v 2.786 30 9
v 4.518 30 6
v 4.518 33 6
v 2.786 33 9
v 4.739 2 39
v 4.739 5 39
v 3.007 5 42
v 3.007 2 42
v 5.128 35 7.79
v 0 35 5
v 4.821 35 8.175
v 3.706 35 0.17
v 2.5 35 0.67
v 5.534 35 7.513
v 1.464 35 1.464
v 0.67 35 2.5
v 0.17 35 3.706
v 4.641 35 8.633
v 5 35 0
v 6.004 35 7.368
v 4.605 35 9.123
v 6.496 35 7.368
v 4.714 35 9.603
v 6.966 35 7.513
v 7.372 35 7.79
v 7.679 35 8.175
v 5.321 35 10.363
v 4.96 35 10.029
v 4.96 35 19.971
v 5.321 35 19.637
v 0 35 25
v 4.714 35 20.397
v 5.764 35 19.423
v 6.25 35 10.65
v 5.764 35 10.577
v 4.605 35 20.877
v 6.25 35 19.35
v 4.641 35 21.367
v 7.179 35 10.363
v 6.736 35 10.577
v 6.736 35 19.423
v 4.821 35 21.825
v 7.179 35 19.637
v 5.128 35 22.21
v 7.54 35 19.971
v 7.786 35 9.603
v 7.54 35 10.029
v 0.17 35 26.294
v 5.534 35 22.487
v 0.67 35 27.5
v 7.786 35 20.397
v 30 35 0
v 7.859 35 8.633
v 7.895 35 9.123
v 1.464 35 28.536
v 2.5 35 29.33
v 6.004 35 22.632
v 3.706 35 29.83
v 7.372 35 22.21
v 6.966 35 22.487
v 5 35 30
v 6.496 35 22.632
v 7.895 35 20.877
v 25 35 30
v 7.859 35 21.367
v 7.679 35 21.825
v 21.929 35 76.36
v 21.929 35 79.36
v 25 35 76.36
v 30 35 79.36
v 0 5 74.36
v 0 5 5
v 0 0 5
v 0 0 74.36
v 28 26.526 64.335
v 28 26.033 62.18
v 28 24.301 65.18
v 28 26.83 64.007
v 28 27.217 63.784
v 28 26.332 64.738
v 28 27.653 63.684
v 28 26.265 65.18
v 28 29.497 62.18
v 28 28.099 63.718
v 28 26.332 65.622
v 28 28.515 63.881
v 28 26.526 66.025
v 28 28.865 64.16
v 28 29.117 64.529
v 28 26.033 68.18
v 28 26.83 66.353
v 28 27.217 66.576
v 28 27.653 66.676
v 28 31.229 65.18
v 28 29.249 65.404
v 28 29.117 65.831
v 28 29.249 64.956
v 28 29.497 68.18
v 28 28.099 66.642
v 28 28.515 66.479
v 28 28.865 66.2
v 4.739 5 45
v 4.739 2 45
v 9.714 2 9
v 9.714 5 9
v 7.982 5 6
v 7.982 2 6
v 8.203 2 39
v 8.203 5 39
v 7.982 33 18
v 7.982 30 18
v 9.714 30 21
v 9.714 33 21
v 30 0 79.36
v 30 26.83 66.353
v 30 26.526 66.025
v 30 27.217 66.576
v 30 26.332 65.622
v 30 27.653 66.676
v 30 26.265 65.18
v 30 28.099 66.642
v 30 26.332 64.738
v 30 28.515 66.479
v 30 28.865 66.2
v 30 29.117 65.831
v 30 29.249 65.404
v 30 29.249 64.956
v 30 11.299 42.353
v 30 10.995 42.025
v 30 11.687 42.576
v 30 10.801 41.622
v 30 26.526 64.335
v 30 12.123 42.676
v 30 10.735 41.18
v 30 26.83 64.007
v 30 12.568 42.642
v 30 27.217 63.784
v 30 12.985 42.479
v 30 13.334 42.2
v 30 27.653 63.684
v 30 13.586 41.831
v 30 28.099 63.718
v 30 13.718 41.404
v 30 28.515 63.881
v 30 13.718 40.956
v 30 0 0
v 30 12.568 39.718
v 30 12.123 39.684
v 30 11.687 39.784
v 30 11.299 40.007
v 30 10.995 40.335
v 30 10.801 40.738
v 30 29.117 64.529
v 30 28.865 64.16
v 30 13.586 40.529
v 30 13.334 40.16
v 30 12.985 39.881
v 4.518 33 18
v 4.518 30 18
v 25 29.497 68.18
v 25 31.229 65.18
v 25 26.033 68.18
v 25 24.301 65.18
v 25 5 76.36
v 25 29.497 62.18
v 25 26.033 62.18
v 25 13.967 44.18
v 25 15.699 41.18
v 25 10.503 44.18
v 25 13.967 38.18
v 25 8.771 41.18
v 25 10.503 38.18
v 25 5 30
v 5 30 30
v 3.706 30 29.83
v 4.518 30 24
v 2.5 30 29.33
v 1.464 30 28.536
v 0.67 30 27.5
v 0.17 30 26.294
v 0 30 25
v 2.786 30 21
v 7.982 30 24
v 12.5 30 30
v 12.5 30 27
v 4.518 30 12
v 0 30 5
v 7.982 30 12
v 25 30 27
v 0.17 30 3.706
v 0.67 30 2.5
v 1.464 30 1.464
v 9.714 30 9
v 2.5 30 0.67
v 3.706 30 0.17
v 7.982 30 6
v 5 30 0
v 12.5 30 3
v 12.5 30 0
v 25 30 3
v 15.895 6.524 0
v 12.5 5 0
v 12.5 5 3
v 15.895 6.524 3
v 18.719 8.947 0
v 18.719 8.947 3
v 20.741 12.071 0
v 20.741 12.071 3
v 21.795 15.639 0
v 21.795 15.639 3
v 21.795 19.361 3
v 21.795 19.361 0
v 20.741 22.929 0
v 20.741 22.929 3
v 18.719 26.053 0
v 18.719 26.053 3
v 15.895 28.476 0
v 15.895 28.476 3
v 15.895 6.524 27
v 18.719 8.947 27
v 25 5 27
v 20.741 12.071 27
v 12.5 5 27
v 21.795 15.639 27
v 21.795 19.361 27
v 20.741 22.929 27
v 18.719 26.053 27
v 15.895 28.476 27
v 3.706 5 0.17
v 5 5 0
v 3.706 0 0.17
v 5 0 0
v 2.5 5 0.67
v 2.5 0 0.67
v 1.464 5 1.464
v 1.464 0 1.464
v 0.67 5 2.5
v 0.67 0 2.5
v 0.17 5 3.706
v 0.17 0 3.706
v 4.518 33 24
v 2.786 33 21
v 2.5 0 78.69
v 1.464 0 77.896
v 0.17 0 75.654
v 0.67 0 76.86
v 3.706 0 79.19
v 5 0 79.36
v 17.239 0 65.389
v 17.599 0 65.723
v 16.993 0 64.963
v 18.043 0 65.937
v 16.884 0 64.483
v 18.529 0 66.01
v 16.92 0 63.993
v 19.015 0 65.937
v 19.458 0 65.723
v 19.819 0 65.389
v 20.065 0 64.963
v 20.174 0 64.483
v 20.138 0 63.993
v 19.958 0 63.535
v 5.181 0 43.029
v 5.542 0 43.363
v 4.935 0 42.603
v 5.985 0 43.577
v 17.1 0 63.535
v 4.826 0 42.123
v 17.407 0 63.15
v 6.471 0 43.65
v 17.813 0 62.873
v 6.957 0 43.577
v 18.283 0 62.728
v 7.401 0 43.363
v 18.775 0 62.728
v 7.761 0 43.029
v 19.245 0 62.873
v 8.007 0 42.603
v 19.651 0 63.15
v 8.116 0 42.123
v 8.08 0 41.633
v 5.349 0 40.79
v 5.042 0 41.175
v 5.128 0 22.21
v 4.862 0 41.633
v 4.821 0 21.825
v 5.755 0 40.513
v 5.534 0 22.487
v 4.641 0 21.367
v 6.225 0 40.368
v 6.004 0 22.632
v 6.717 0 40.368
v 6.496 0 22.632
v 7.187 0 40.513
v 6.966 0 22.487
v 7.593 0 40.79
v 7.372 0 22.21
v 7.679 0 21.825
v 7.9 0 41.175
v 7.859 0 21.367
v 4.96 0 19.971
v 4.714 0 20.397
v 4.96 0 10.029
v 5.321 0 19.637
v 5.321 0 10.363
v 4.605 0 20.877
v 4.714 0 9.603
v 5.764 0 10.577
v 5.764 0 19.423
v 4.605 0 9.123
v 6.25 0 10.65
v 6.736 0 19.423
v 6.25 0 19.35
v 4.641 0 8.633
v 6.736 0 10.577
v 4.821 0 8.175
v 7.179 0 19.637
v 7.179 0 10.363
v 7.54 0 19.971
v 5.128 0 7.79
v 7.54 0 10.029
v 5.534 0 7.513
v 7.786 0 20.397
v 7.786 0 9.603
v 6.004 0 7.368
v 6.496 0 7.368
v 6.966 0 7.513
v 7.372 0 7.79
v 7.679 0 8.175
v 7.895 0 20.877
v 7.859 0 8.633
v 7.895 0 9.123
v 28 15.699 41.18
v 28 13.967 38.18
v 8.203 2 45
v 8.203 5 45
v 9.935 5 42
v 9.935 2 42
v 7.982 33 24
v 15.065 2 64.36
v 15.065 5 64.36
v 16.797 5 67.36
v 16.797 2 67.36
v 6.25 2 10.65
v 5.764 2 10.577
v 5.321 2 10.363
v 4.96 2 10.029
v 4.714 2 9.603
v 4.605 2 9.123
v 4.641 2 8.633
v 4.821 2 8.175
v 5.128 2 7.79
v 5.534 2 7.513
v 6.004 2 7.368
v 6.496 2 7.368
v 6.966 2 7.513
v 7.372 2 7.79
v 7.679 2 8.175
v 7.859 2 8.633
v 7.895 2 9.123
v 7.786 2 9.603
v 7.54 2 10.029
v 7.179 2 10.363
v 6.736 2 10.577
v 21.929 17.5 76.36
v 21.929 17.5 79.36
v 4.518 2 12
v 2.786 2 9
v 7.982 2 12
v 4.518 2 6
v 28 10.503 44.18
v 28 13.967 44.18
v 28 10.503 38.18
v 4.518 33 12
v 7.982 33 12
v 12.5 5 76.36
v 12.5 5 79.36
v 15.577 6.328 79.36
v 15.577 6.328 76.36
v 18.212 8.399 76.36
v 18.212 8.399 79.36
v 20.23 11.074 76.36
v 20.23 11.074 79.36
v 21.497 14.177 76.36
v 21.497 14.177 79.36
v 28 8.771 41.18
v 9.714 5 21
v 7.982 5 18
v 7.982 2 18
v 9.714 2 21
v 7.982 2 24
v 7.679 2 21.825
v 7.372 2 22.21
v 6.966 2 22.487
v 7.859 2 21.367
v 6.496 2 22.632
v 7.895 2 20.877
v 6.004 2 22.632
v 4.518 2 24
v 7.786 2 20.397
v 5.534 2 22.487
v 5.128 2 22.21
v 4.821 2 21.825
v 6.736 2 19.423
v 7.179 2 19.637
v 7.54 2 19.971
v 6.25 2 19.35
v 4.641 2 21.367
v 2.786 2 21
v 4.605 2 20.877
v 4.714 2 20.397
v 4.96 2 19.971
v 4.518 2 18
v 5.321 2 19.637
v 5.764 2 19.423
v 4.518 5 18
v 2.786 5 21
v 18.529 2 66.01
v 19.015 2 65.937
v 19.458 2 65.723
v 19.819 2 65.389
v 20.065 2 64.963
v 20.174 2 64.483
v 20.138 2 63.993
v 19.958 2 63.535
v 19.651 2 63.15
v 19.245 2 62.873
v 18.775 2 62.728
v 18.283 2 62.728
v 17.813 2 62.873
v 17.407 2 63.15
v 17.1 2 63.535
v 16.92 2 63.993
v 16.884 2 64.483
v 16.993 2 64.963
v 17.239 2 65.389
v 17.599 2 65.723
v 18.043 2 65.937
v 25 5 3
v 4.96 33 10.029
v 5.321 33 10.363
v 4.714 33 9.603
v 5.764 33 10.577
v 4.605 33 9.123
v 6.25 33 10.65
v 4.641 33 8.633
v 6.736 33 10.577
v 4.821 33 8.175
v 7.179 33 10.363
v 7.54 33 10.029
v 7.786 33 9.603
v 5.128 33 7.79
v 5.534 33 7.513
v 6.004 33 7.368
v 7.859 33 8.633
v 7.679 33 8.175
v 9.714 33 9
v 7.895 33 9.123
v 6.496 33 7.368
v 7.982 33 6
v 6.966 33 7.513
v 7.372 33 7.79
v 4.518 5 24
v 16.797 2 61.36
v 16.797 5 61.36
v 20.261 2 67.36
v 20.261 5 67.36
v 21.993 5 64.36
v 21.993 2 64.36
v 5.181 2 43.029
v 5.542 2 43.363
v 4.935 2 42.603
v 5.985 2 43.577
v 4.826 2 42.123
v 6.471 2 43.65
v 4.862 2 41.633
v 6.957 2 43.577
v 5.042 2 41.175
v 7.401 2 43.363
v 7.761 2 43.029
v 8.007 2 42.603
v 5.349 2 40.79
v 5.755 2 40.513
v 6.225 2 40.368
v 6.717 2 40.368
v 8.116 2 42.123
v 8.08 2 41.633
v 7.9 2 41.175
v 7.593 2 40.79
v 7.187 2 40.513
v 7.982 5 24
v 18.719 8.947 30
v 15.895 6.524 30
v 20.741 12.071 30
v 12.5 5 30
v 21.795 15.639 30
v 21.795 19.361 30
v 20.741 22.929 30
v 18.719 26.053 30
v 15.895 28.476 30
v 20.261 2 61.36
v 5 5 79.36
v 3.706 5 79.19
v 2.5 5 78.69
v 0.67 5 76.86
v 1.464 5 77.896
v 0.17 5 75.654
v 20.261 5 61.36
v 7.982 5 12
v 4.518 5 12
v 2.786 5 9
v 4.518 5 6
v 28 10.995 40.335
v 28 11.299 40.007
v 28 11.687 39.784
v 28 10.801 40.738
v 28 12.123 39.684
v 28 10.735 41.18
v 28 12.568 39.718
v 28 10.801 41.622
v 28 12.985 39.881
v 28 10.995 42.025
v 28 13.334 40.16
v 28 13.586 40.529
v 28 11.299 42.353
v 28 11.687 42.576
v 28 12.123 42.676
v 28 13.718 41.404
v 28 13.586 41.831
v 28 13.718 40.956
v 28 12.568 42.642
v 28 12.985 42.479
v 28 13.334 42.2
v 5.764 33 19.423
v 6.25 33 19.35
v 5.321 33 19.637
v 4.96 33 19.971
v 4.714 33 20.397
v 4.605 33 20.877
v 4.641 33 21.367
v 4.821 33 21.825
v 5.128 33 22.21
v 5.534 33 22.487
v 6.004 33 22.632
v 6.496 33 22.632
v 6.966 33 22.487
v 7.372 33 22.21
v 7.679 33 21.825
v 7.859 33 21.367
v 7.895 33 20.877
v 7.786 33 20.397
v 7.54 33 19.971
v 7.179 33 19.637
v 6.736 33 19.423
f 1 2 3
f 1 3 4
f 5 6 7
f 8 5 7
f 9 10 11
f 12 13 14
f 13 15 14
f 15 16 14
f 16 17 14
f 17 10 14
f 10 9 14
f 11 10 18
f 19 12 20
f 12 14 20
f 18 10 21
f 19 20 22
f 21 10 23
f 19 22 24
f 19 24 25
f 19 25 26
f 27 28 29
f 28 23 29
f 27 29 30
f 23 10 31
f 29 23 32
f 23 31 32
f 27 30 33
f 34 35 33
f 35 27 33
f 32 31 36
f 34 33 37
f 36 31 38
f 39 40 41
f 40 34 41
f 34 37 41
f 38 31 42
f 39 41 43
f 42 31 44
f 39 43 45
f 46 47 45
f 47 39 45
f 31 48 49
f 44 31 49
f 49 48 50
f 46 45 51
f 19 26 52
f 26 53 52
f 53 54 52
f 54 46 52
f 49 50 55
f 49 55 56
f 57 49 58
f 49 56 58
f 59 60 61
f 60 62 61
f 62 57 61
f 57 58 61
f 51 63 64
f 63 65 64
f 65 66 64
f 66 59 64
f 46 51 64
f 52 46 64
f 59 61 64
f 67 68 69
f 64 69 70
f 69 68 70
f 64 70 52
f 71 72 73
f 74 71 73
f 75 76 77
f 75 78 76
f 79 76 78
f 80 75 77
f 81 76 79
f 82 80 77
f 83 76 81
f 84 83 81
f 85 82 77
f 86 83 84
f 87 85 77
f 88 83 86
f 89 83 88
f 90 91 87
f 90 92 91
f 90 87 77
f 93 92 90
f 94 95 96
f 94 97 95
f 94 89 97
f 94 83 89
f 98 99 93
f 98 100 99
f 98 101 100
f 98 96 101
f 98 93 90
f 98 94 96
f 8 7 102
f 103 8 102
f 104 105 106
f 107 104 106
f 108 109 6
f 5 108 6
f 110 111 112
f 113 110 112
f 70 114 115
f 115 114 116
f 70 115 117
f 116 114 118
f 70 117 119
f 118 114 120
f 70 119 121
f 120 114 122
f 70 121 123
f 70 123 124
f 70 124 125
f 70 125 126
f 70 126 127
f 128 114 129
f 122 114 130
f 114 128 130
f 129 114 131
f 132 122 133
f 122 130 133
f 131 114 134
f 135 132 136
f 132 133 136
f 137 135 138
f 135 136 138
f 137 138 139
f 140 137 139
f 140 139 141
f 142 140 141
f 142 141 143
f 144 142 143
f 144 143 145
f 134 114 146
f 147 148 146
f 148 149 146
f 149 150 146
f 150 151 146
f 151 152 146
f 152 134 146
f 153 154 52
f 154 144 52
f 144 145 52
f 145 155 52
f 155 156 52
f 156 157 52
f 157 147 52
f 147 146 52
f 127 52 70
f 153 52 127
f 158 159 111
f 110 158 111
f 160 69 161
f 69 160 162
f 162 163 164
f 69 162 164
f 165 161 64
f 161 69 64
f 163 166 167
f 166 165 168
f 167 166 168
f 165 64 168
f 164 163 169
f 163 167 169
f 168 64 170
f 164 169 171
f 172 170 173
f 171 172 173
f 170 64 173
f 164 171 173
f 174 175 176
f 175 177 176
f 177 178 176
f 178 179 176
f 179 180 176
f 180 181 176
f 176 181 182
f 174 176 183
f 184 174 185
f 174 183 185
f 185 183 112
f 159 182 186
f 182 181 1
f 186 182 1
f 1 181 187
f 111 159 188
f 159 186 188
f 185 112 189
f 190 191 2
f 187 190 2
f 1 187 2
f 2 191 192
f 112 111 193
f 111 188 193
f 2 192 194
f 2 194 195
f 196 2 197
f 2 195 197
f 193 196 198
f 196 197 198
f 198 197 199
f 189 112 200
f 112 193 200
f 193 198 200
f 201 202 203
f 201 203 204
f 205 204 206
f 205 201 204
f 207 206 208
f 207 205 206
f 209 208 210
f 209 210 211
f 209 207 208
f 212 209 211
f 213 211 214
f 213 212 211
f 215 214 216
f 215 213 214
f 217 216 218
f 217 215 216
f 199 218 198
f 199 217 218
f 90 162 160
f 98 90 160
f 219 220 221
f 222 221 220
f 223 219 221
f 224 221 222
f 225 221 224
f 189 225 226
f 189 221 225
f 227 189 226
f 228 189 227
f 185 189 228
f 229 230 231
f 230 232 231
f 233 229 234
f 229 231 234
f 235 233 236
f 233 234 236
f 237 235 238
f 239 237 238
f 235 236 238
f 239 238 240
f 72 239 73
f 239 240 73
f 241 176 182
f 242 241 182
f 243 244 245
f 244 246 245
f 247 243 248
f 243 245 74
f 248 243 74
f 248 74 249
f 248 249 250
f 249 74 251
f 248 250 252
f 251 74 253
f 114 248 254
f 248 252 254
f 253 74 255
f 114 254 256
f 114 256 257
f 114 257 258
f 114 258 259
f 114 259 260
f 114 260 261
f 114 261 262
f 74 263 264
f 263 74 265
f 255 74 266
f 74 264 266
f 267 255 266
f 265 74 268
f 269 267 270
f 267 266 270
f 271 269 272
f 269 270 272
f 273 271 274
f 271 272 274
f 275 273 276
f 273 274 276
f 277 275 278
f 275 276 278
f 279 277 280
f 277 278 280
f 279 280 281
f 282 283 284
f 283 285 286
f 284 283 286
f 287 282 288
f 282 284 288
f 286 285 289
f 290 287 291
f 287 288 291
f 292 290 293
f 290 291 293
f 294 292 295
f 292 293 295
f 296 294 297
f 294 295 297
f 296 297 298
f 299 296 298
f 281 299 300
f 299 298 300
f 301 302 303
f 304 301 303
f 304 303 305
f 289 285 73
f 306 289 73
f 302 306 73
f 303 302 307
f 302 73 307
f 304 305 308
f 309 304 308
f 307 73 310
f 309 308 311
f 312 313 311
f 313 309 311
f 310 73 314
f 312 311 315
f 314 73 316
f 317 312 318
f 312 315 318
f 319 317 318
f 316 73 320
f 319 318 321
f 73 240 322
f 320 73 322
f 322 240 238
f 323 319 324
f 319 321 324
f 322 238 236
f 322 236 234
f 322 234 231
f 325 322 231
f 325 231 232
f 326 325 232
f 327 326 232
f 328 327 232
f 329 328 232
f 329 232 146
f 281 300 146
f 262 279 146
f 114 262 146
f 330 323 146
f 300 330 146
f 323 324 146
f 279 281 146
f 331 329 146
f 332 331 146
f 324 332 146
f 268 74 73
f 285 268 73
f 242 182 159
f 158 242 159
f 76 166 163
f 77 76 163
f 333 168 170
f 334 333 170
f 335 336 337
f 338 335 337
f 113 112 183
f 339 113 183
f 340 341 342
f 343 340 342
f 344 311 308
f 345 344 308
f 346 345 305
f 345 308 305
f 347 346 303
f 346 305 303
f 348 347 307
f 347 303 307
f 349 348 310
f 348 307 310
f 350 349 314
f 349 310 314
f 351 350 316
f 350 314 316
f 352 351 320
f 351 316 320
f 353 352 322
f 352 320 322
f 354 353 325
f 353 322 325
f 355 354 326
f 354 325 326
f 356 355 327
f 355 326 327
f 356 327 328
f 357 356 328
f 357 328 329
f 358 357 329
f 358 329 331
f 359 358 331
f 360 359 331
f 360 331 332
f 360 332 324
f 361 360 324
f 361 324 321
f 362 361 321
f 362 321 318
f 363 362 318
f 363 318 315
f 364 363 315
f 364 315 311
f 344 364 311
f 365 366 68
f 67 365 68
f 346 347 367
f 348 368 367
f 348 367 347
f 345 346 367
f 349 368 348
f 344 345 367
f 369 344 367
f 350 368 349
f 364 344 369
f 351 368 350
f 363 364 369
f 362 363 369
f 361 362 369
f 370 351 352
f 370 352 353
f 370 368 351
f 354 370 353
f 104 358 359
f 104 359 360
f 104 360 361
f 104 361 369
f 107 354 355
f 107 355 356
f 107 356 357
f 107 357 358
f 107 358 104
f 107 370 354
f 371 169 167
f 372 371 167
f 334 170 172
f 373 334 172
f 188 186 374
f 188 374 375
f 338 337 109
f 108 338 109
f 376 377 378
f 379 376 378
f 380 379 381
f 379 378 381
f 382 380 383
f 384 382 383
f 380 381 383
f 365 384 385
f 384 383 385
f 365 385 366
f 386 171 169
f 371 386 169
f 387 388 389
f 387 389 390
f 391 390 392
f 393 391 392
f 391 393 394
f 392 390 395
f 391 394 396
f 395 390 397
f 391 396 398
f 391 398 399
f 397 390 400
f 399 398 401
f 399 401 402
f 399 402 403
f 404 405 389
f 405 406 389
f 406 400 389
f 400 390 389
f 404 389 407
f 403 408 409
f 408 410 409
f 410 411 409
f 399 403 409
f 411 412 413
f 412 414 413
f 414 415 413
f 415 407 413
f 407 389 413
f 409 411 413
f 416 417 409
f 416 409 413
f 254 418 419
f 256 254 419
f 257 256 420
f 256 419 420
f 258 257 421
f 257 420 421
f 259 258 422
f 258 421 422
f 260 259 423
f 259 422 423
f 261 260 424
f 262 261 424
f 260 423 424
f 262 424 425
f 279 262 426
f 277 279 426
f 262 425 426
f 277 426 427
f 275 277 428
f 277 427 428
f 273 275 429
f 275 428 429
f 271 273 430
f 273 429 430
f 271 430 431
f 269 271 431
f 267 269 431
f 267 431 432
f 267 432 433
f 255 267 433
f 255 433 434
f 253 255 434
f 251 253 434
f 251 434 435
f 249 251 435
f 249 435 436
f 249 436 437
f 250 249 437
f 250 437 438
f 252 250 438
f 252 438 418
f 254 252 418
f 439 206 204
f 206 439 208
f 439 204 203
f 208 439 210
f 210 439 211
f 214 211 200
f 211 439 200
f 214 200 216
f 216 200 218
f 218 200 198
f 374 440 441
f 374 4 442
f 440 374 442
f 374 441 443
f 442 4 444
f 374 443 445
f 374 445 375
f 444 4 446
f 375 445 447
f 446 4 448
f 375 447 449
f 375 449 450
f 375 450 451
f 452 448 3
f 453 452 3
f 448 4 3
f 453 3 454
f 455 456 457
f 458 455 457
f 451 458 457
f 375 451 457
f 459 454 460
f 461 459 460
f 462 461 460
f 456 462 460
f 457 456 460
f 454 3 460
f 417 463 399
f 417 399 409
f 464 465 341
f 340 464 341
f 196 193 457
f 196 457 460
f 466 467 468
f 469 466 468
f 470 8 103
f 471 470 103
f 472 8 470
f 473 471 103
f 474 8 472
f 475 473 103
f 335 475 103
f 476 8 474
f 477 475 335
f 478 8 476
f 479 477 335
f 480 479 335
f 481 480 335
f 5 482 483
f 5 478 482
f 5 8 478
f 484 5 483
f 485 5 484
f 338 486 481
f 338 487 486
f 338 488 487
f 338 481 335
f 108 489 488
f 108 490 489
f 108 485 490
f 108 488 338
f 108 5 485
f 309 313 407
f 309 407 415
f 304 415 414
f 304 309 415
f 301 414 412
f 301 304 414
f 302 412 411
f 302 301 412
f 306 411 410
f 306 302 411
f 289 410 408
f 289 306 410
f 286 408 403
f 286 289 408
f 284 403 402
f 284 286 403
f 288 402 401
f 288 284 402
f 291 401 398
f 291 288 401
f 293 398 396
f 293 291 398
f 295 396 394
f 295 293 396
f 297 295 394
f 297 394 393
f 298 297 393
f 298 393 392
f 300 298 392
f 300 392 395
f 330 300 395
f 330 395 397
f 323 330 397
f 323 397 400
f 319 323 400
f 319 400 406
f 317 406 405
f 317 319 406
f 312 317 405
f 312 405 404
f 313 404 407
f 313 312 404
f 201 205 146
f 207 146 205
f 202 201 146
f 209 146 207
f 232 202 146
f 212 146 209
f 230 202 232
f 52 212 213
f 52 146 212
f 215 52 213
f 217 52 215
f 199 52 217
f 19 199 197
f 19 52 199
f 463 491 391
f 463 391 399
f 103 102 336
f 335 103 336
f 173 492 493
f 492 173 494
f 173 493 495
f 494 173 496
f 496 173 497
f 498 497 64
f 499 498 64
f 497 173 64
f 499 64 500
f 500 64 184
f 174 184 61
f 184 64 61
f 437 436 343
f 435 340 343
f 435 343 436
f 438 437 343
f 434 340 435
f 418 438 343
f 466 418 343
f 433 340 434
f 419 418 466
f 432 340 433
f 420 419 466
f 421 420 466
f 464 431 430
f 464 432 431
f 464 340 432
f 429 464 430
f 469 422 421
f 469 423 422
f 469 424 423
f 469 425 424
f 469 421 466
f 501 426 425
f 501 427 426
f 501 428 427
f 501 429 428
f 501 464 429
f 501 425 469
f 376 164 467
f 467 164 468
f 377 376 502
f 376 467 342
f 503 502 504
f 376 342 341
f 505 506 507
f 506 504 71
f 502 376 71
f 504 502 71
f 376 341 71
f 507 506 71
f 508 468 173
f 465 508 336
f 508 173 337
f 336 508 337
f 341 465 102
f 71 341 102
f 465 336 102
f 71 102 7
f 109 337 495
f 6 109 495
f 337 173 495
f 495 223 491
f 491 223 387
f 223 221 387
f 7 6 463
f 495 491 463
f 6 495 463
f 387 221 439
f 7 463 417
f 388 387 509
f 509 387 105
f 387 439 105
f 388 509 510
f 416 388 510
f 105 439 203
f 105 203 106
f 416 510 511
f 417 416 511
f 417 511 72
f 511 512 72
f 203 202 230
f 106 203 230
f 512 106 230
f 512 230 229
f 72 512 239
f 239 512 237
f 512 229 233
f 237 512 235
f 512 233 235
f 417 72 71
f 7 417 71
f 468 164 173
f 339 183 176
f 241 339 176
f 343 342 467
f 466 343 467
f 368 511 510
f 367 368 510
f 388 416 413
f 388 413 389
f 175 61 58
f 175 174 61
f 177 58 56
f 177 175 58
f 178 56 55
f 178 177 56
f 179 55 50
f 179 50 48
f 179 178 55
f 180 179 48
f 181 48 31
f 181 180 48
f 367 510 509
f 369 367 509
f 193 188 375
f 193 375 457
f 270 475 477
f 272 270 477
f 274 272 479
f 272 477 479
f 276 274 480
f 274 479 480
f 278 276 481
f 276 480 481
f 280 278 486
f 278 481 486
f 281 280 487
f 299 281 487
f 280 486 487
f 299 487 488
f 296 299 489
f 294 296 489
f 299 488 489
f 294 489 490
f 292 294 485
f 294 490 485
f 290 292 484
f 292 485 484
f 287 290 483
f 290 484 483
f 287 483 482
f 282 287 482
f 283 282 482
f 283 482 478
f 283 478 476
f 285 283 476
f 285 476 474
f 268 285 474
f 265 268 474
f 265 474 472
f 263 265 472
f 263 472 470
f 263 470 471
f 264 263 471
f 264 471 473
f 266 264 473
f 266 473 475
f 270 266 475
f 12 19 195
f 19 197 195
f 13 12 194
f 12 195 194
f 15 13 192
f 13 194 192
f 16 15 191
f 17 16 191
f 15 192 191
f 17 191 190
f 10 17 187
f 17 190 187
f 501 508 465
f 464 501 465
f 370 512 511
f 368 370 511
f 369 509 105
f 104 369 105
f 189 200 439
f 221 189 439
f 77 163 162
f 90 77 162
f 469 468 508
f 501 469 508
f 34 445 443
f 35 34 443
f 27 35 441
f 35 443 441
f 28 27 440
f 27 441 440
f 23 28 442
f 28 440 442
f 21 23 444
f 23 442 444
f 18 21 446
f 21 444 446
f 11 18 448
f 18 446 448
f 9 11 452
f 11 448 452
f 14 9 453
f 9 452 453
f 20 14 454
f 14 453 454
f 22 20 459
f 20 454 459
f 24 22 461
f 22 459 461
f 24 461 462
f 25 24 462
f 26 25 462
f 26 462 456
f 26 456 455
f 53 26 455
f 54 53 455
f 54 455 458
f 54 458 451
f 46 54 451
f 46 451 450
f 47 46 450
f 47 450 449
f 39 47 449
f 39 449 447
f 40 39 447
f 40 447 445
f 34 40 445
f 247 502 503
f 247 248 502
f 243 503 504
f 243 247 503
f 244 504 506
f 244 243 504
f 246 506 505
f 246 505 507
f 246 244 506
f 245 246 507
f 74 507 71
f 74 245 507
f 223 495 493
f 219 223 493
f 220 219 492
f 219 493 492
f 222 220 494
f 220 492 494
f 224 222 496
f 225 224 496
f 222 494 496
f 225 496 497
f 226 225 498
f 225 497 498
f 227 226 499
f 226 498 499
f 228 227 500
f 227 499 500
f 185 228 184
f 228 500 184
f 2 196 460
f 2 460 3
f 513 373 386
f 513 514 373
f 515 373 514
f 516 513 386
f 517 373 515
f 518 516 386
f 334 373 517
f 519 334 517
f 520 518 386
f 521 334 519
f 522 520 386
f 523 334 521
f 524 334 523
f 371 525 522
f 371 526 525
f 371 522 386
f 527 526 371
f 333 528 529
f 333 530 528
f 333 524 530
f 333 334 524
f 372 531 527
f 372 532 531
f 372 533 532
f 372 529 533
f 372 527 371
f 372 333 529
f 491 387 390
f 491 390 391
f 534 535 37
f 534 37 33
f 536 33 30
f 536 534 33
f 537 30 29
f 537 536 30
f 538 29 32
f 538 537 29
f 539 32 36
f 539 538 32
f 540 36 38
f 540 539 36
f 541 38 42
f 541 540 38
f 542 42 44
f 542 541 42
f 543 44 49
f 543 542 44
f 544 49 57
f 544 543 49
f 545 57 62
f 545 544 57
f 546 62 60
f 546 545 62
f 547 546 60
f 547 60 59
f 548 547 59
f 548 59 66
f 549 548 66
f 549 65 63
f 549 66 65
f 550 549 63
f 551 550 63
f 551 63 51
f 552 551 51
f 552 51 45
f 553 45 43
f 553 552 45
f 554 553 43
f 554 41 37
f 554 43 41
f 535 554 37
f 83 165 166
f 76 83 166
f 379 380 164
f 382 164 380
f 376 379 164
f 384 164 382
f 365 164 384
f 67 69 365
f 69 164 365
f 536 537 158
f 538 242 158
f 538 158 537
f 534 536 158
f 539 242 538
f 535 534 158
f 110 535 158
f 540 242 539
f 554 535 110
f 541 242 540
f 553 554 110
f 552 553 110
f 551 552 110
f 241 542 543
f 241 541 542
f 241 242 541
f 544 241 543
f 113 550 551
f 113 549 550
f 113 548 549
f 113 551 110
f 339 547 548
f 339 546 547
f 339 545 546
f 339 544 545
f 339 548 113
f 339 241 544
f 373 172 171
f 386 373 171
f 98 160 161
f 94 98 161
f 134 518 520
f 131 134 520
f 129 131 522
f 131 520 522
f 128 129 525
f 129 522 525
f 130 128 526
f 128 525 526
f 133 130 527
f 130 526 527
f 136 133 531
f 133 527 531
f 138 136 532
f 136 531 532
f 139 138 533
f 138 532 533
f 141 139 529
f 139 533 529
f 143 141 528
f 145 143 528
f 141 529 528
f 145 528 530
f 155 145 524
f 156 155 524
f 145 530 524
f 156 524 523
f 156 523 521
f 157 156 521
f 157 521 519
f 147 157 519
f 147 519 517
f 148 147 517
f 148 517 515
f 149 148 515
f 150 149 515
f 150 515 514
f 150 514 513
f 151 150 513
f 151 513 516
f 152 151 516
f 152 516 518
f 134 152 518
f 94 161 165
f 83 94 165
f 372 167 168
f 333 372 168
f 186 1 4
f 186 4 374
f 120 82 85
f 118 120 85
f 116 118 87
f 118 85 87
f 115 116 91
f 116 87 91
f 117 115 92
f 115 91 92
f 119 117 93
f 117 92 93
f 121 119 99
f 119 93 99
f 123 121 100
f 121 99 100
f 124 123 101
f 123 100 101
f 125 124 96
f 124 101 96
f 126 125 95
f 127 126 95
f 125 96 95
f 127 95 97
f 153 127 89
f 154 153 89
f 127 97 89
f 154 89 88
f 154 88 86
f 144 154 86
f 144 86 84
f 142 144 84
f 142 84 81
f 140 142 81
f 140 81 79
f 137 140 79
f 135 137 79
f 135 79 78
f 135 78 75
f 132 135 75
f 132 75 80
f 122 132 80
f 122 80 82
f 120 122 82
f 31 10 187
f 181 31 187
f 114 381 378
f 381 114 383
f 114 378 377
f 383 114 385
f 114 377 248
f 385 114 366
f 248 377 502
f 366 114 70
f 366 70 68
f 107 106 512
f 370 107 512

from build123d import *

# Parameters (mm, degrees)
EXTRUDE_1_DEPTH     = 30
EXTRUDE_2_DEPTH     = 3
CUT_EXTRUDE_1_DEPTH = 3
CUT_EXTRUDE_START   = -17
SKETCH_4_R          = 1.65
CUT_EXTRUDE_2_DEPTH = 76
CUT_EXTRUDE_3_DEPTH = 3
FILLET_1_R          = 5
EXTRUDE_3_DEPTH     = 49.36
EXTRUDE_4_DEPTH     = 3
CUT_EXTRUDE_4_DEPTH = 3
SKETCH_10_R         = 1.5
CUT_EXTRUDE_5_DEPTH = 12
FILLET_2_R          = 5
CUT_EXTRUDE_6_DEPTH = 3
SKETCH_12_R         = 1.65
CUT_EXTRUDE_7_DEPTH = 15


with BuildPart() as part:
    # Sketch 1 → Extrude 1 (new body)
    with BuildSketch(Plane.XY):
        Polygon((0, 0), (30, 0), (30, 35), (0, 35), (0, 30), (25, 30), (25, 5), (0, 5), align=None)
    extrude(amount=EXTRUDE_1_DEPTH)

    # Sketch 2 → Extrude 2 (add)
    with BuildSketch(Plane.XY.offset(30)):
        with BuildLine():
            Line((12.5, 30), (25, 30))
            Line((25, 30), (25, 5))
            Line((25, 5), (12.5, 5))
            ThreePointArc((12.5, 5), (21.929285786, 17.5), (12.5, 30))
        make_face()
    extrude_2 = extrude(amount=-EXTRUDE_2_DEPTH)

    # Mirror 1: Extrude 2 across plane
    add(extrude_2.mirror(Plane.XY.offset(15)))

    # Sketch 3 → Cut-Extrude 1 (cut)
    with BuildSketch(Plane(origin=(0, 5, 0), x_dir=(1, 0, 0), z_dir=(0, 1, 0))):
        Polygon((4.517949192, -24), (2.785898385, -21), (4.517949192, -18), (7.982050808, -18), (9.714101615, -21), (7.982050808, -24), align=None)
        Polygon((2.785898385, -9), (4.517949192, -12), (7.982050808, -12), (9.714101615, -9), (7.982050808, -6), (4.517949192, -6), align=None)
    extrude(amount=-CUT_EXTRUDE_1_DEPTH, mode=Mode.SUBTRACT)

    # Sketch 4 → Cut-Extrude 2 (cut)
    with BuildSketch(Plane(origin=(0, 2, 0), x_dir=(1, 0, 0), z_dir=(0, 1, 0)).offset(CUT_EXTRUDE_START)):
        with Locations(Location((6.25, -21, 0), (0, 0, 90))):
            Circle(SKETCH_4_R)
    cut_extrude_2 = extrude(amount=CUT_EXTRUDE_2_DEPTH, mode=Mode.SUBTRACT)

    # Mirror 2: Cut-Extrude 2 across plane
    add(cut_extrude_2.mirror(Plane.XY.offset(15)), mode=Mode.SUBTRACT)

    # Sketch 5 → Cut-Extrude 3 (cut)
    with BuildSketch(Plane.XZ.offset(-30)):
        Polygon((9.714101615, 21), (7.982050808, 24), (4.517949192, 24), (2.785898385, 21), (4.517949192, 18), (7.982050808, 18), align=None)
    cut_extrude_3 = extrude(amount=-CUT_EXTRUDE_3_DEPTH, mode=Mode.SUBTRACT)

    # Mirror 3: Cut-Extrude 3 across plane
    add(cut_extrude_3.mirror(Plane.XY.offset(15)), mode=Mode.SUBTRACT)

    # Fillet 1
    fillet_1_edges = [part.edges().sort_by_distance(p)[0] for p in [
        (0, 2.5, 0),
        (0, 32.5, 30),
        (0, 32.5, 0),
    ]]
    fillet(fillet_1_edges, radius=FILLET_1_R)

    # Sketch 7 → Extrude 3 (add)
    with BuildSketch(Plane.XY.offset(30)):
        Polygon((0, 0), (30, 0), (30, 35), (25, 35), (25, 5), (0, 5), align=None)
    extrude(amount=EXTRUDE_3_DEPTH)

    # Sketch 8 → Extrude 4 (add)
    with BuildSketch(Plane.XY.offset(79.36)):
        with BuildLine():
            Line((21.929285786, 17.5), (21.929285786, 35))
            Line((21.929285786, 35), (25, 35))
            Line((25, 35), (25, 5))
            Line((25, 5), (12.5, 5))
            ThreePointArc((12.5, 5), (19.307611392, 9.67118415), (21.929285786, 17.5))
        make_face()
    extrude(amount=-EXTRUDE_4_DEPTH)

    # Sketch 9 → Cut-Extrude 4 (cut)
    with BuildSketch(Plane.ZY.offset(-25)):
        Polygon((65.18, 31.229416542), (62.18, 29.497365734), (62.18, 26.033264119), (65.18, 24.301213312), (68.18, 26.033264119), (68.18, 29.497365734), align=None)
        Polygon((41.18, 15.698786688), (38.18, 13.966735881), (38.18, 10.502634266), (41.18, 8.770583458), (44.18, 10.502634266), (44.18, 13.966735881), align=None)
    extrude(amount=-CUT_EXTRUDE_4_DEPTH, mode=Mode.SUBTRACT)

    # Sketch 10 → Cut-Extrude 5 (cut)
    with BuildSketch(Plane.ZY.offset(-28)):
        with Locations(Location((41.18, 12.234685073, 0), (0, 0, 270))):
            Circle(SKETCH_10_R)
        with Locations(Location((65.18, 27.765314927, 0), (0, 0, 270))):
            Circle(SKETCH_10_R)
    extrude(amount=-CUT_EXTRUDE_5_DEPTH, mode=Mode.SUBTRACT)

    # Fillet 2
    fillet_2_edges = [part.edges().sort_by_distance(p)[0] for p in [
        (0, 2.5, 79.36),
    ]]
    fillet(fillet_2_edges, radius=FILLET_2_R)

    # Sketch 11 → Cut-Extrude 6 (cut)
    with BuildSketch(Plane(origin=(0, 5, 0), x_dir=(1, 0, 0), z_dir=(0, 1, 0))):
        Polygon((15.064802613, -64.36), (16.79685342, -67.36), (20.260955035, -67.36), (21.993005843, -64.36), (20.260955035, -61.36), (16.79685342, -61.36), align=None)
        Polygon((9.935197387, -42), (8.20314658, -39), (4.739044965, -39), (3.006994157, -42), (4.739044965, -45), (8.20314658, -45), align=None)
    extrude(amount=-CUT_EXTRUDE_6_DEPTH, mode=Mode.SUBTRACT)

    # Sketch 12 → Cut-Extrude 7 (cut)
    with BuildSketch(Plane(origin=(0, 2, 0), x_dir=(1, 0, 0), z_dir=(0, 1, 0))):
        with Locations(Location((6.471095772, -42, 0), (0, 0, 270))):
            Circle(SKETCH_12_R)
        with Locations(Location((18.528904228, -64.36, 0), (0, 0, 270))):
            Circle(SKETCH_12_R)
    extrude(amount=-CUT_EXTRUDE_7_DEPTH, mode=Mode.SUBTRACT)


solid = part.part
